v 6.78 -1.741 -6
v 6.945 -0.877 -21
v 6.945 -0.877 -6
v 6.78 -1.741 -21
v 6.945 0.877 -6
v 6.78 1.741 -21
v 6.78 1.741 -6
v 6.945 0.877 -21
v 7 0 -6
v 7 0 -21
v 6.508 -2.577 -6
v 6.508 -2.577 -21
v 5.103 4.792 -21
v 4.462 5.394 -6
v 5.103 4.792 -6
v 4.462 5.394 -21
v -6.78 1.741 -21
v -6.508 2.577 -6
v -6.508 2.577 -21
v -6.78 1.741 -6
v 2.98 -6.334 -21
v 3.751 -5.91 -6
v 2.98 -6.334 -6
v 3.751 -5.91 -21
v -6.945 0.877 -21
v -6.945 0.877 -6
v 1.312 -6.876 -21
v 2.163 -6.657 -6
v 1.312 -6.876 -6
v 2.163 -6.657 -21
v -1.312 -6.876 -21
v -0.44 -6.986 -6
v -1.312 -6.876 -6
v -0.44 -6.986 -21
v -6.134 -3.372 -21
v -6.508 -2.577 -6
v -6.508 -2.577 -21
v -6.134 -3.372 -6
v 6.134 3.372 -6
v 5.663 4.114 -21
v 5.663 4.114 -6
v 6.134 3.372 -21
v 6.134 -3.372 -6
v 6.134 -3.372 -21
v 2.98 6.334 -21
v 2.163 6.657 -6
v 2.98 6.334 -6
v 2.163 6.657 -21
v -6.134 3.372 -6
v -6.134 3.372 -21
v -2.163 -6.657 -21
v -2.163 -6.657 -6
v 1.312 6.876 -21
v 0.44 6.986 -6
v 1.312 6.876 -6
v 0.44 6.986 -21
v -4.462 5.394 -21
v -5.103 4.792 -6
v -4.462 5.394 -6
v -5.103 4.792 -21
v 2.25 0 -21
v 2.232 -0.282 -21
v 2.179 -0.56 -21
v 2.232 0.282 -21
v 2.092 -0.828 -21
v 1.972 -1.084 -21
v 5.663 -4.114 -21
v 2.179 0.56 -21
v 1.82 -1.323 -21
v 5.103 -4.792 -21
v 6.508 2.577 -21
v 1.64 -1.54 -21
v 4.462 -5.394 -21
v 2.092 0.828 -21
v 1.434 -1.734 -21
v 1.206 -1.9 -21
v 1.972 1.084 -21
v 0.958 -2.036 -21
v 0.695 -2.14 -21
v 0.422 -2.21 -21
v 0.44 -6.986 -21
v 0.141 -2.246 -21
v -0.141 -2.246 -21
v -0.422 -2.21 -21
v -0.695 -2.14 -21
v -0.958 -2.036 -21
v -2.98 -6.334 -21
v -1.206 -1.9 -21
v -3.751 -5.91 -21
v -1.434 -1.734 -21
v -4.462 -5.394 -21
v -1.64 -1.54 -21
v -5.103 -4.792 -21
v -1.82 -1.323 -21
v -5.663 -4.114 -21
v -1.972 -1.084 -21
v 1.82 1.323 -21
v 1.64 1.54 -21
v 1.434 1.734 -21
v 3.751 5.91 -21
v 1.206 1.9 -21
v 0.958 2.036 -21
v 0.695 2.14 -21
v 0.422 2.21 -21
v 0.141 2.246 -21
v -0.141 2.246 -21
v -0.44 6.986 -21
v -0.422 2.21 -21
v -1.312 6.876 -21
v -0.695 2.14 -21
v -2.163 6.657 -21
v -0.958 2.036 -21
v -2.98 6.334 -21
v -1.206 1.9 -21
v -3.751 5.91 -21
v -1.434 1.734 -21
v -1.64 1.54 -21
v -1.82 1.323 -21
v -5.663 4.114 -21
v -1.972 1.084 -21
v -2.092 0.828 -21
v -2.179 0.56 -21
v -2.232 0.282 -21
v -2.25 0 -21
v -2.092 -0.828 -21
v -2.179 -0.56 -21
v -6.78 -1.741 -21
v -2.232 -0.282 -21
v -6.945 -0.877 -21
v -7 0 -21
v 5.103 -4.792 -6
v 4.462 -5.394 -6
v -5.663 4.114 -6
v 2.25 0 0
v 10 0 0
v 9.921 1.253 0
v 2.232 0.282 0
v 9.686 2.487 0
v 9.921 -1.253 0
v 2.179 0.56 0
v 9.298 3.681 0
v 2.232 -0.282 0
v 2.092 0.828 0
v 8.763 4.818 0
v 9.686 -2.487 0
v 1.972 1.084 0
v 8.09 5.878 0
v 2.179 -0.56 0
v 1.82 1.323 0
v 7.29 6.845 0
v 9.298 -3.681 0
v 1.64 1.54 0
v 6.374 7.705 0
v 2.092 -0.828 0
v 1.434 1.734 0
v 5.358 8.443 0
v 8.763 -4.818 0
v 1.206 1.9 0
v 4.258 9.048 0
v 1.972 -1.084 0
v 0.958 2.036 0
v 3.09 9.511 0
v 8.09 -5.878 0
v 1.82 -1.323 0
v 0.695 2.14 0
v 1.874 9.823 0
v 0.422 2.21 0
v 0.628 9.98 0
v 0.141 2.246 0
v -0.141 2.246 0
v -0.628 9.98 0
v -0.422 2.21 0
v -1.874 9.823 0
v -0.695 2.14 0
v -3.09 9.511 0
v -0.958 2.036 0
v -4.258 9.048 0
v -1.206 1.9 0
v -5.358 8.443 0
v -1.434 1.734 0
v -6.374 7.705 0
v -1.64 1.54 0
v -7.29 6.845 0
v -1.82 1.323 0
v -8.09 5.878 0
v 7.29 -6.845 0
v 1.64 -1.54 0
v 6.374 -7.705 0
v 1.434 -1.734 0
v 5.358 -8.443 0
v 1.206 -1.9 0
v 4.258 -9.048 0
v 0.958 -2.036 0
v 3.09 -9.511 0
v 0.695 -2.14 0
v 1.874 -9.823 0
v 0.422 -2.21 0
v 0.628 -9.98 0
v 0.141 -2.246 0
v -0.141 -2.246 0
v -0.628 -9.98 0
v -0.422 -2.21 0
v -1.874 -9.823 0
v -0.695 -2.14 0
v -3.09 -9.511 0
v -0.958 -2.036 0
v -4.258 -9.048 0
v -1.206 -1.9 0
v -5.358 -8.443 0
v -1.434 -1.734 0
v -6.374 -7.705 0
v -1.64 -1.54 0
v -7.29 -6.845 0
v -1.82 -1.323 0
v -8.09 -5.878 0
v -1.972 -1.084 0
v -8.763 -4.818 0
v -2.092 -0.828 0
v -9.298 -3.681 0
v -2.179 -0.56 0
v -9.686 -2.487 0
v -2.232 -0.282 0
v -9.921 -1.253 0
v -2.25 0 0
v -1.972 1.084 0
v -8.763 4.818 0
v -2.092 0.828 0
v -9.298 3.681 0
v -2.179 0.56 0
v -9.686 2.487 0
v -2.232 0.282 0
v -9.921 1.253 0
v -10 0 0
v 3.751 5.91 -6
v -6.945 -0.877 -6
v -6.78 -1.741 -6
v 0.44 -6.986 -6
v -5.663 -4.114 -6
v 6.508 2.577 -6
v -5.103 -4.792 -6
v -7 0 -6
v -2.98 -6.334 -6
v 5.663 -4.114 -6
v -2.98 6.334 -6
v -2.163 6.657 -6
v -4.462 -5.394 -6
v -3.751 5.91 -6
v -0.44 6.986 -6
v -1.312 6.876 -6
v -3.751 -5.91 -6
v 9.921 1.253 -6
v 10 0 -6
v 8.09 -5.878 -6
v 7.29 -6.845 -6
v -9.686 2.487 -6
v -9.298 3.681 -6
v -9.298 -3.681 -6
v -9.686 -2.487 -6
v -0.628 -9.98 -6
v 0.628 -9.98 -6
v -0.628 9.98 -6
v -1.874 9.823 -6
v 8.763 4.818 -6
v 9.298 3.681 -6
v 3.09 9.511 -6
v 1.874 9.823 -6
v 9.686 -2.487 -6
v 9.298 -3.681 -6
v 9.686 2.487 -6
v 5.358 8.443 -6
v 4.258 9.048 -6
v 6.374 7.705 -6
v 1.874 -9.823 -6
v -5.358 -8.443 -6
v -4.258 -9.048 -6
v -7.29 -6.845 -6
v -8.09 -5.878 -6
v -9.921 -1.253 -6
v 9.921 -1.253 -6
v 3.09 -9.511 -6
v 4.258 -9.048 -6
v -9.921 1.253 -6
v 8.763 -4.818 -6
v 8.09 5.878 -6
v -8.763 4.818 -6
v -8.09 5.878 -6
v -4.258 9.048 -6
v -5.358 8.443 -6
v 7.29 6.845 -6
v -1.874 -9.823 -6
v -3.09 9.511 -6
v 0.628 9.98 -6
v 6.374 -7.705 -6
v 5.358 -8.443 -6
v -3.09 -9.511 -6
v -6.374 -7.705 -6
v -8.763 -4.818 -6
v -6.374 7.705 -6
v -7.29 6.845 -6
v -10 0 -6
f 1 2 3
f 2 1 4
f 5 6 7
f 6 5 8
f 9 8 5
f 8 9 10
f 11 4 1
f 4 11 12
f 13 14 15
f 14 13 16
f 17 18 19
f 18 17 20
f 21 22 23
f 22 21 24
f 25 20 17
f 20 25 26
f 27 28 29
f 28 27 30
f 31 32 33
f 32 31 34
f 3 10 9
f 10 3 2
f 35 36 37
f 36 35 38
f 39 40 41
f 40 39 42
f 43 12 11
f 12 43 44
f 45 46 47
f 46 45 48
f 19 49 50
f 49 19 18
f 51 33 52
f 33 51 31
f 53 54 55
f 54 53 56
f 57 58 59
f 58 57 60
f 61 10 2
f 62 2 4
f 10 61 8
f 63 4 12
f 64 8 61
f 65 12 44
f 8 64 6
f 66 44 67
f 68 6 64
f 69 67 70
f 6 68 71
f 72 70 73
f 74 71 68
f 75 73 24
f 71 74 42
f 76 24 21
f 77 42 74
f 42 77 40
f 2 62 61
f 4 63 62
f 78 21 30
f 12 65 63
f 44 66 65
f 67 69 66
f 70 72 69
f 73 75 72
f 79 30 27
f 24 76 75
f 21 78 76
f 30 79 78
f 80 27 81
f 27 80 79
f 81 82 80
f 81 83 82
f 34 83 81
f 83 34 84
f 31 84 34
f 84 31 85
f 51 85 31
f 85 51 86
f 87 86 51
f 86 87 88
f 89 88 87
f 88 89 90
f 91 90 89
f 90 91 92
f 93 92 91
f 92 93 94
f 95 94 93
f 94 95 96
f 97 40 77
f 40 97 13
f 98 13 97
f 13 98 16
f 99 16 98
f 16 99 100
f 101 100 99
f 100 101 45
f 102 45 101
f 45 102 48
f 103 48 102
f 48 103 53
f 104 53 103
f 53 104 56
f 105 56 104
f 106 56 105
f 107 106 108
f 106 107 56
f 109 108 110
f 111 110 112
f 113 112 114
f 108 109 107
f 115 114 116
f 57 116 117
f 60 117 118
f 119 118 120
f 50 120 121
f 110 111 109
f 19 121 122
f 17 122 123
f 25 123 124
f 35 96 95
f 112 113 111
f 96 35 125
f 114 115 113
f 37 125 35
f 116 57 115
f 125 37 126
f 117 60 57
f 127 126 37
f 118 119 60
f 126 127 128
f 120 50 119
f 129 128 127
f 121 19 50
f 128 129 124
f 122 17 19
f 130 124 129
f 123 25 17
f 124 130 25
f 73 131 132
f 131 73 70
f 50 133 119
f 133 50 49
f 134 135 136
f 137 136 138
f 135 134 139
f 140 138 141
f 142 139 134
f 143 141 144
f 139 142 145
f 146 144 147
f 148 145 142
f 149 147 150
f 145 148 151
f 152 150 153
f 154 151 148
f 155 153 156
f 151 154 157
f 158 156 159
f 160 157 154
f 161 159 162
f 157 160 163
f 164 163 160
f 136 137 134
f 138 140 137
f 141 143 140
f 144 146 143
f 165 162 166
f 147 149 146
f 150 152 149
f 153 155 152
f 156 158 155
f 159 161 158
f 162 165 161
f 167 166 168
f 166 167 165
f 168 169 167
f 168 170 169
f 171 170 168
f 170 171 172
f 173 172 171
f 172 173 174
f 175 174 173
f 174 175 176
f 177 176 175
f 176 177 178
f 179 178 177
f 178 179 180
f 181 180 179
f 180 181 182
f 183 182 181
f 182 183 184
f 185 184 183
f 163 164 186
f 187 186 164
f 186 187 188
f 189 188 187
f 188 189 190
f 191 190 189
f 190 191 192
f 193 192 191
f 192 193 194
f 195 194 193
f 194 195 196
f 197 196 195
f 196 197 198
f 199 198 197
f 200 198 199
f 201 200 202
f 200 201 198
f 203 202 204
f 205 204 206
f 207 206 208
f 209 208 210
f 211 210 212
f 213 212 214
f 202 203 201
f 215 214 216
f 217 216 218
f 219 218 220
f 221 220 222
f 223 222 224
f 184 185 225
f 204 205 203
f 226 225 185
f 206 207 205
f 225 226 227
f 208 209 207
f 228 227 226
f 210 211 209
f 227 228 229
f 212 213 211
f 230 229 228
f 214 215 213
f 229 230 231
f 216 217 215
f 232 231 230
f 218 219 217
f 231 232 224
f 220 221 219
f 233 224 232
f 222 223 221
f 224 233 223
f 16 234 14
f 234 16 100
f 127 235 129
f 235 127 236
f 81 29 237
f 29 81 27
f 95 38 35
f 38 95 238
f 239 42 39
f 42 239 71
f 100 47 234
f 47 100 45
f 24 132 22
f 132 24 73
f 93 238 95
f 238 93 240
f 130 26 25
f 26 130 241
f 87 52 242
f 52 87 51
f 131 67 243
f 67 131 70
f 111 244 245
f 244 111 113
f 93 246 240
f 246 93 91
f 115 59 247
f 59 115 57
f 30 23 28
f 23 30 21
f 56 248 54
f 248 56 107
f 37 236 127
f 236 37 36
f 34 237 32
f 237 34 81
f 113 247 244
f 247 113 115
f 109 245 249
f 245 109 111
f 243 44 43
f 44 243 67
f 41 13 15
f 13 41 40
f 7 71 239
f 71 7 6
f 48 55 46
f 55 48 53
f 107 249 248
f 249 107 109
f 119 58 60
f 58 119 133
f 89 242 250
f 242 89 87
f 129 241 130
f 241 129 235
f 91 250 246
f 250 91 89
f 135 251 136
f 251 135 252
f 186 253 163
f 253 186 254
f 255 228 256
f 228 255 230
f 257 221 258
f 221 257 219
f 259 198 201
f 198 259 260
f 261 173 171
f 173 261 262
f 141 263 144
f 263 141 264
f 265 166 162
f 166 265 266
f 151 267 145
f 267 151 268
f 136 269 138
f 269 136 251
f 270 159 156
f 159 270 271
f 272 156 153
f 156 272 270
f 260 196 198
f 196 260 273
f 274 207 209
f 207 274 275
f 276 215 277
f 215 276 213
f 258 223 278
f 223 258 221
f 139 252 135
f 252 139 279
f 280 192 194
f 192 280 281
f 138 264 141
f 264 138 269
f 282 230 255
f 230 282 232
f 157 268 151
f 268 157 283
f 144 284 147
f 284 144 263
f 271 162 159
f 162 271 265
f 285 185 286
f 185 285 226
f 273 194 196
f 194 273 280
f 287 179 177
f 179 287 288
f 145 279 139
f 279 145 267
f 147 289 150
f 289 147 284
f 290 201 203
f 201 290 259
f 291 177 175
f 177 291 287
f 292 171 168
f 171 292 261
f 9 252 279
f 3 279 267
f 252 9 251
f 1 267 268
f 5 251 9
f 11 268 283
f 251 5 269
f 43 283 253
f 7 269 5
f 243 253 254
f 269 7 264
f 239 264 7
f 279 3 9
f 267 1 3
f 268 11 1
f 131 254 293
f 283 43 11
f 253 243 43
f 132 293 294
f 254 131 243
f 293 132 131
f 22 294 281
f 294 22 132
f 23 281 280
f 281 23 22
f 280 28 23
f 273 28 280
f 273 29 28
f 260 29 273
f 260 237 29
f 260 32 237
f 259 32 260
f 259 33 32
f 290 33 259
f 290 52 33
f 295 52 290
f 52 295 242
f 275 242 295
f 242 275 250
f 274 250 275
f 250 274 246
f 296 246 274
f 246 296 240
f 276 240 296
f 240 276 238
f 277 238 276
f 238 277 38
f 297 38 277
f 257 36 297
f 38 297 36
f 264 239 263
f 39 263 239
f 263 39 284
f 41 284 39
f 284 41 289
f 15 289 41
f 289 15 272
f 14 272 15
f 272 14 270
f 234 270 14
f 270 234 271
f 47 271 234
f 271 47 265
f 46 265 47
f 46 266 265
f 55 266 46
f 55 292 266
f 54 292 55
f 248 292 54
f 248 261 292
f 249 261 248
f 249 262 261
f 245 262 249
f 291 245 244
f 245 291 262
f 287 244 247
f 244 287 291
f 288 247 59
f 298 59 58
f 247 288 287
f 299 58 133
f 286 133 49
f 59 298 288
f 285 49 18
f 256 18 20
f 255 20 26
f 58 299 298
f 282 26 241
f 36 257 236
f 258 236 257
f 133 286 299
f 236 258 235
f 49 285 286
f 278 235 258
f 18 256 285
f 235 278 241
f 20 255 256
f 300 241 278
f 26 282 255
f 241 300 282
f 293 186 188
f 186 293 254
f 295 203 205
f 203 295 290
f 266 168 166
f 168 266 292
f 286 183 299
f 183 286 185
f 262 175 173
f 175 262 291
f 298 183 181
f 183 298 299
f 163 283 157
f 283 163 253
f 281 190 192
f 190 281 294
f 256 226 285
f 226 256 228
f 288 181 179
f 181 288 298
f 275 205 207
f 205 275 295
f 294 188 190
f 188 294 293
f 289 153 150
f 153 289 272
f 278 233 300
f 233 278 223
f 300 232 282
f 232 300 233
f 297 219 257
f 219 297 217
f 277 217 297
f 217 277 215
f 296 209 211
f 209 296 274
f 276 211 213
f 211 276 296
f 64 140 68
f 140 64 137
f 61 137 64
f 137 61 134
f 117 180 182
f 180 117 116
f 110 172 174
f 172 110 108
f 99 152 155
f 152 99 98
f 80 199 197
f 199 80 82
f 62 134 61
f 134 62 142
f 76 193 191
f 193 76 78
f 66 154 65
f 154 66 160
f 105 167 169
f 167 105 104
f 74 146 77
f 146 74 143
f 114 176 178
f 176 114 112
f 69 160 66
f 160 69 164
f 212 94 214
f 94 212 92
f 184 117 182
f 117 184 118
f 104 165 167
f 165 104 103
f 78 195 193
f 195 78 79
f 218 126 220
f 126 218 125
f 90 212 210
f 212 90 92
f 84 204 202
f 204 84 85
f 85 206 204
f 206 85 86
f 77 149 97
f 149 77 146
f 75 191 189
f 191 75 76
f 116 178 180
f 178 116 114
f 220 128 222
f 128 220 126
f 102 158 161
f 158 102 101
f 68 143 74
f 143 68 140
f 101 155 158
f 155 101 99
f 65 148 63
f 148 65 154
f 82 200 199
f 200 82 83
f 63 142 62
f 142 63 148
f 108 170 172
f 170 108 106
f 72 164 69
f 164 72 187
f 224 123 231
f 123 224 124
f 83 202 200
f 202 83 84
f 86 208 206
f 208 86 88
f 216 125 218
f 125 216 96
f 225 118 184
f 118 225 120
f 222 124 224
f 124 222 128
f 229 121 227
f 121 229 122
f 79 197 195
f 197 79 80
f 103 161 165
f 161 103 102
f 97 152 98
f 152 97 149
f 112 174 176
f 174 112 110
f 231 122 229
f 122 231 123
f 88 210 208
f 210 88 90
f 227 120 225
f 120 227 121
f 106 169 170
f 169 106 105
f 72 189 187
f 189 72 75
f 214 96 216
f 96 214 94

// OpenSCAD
$fn = 50;


difference() {
	union() {
		translate(v = [0, 0, -21.0000000000]) {
			cylinder(h = 21, r = 7.0000000000);
		}
		translate(v = [0, 0, -6.0000000000]) {
			cylinder(h = 6, r = 10.0000000000);
		}
	}
	union() {
		#translate(v = [0, 0, -21]) {
			cylinder(h = 21, r = 2.2500000000);
		}
	}
}
